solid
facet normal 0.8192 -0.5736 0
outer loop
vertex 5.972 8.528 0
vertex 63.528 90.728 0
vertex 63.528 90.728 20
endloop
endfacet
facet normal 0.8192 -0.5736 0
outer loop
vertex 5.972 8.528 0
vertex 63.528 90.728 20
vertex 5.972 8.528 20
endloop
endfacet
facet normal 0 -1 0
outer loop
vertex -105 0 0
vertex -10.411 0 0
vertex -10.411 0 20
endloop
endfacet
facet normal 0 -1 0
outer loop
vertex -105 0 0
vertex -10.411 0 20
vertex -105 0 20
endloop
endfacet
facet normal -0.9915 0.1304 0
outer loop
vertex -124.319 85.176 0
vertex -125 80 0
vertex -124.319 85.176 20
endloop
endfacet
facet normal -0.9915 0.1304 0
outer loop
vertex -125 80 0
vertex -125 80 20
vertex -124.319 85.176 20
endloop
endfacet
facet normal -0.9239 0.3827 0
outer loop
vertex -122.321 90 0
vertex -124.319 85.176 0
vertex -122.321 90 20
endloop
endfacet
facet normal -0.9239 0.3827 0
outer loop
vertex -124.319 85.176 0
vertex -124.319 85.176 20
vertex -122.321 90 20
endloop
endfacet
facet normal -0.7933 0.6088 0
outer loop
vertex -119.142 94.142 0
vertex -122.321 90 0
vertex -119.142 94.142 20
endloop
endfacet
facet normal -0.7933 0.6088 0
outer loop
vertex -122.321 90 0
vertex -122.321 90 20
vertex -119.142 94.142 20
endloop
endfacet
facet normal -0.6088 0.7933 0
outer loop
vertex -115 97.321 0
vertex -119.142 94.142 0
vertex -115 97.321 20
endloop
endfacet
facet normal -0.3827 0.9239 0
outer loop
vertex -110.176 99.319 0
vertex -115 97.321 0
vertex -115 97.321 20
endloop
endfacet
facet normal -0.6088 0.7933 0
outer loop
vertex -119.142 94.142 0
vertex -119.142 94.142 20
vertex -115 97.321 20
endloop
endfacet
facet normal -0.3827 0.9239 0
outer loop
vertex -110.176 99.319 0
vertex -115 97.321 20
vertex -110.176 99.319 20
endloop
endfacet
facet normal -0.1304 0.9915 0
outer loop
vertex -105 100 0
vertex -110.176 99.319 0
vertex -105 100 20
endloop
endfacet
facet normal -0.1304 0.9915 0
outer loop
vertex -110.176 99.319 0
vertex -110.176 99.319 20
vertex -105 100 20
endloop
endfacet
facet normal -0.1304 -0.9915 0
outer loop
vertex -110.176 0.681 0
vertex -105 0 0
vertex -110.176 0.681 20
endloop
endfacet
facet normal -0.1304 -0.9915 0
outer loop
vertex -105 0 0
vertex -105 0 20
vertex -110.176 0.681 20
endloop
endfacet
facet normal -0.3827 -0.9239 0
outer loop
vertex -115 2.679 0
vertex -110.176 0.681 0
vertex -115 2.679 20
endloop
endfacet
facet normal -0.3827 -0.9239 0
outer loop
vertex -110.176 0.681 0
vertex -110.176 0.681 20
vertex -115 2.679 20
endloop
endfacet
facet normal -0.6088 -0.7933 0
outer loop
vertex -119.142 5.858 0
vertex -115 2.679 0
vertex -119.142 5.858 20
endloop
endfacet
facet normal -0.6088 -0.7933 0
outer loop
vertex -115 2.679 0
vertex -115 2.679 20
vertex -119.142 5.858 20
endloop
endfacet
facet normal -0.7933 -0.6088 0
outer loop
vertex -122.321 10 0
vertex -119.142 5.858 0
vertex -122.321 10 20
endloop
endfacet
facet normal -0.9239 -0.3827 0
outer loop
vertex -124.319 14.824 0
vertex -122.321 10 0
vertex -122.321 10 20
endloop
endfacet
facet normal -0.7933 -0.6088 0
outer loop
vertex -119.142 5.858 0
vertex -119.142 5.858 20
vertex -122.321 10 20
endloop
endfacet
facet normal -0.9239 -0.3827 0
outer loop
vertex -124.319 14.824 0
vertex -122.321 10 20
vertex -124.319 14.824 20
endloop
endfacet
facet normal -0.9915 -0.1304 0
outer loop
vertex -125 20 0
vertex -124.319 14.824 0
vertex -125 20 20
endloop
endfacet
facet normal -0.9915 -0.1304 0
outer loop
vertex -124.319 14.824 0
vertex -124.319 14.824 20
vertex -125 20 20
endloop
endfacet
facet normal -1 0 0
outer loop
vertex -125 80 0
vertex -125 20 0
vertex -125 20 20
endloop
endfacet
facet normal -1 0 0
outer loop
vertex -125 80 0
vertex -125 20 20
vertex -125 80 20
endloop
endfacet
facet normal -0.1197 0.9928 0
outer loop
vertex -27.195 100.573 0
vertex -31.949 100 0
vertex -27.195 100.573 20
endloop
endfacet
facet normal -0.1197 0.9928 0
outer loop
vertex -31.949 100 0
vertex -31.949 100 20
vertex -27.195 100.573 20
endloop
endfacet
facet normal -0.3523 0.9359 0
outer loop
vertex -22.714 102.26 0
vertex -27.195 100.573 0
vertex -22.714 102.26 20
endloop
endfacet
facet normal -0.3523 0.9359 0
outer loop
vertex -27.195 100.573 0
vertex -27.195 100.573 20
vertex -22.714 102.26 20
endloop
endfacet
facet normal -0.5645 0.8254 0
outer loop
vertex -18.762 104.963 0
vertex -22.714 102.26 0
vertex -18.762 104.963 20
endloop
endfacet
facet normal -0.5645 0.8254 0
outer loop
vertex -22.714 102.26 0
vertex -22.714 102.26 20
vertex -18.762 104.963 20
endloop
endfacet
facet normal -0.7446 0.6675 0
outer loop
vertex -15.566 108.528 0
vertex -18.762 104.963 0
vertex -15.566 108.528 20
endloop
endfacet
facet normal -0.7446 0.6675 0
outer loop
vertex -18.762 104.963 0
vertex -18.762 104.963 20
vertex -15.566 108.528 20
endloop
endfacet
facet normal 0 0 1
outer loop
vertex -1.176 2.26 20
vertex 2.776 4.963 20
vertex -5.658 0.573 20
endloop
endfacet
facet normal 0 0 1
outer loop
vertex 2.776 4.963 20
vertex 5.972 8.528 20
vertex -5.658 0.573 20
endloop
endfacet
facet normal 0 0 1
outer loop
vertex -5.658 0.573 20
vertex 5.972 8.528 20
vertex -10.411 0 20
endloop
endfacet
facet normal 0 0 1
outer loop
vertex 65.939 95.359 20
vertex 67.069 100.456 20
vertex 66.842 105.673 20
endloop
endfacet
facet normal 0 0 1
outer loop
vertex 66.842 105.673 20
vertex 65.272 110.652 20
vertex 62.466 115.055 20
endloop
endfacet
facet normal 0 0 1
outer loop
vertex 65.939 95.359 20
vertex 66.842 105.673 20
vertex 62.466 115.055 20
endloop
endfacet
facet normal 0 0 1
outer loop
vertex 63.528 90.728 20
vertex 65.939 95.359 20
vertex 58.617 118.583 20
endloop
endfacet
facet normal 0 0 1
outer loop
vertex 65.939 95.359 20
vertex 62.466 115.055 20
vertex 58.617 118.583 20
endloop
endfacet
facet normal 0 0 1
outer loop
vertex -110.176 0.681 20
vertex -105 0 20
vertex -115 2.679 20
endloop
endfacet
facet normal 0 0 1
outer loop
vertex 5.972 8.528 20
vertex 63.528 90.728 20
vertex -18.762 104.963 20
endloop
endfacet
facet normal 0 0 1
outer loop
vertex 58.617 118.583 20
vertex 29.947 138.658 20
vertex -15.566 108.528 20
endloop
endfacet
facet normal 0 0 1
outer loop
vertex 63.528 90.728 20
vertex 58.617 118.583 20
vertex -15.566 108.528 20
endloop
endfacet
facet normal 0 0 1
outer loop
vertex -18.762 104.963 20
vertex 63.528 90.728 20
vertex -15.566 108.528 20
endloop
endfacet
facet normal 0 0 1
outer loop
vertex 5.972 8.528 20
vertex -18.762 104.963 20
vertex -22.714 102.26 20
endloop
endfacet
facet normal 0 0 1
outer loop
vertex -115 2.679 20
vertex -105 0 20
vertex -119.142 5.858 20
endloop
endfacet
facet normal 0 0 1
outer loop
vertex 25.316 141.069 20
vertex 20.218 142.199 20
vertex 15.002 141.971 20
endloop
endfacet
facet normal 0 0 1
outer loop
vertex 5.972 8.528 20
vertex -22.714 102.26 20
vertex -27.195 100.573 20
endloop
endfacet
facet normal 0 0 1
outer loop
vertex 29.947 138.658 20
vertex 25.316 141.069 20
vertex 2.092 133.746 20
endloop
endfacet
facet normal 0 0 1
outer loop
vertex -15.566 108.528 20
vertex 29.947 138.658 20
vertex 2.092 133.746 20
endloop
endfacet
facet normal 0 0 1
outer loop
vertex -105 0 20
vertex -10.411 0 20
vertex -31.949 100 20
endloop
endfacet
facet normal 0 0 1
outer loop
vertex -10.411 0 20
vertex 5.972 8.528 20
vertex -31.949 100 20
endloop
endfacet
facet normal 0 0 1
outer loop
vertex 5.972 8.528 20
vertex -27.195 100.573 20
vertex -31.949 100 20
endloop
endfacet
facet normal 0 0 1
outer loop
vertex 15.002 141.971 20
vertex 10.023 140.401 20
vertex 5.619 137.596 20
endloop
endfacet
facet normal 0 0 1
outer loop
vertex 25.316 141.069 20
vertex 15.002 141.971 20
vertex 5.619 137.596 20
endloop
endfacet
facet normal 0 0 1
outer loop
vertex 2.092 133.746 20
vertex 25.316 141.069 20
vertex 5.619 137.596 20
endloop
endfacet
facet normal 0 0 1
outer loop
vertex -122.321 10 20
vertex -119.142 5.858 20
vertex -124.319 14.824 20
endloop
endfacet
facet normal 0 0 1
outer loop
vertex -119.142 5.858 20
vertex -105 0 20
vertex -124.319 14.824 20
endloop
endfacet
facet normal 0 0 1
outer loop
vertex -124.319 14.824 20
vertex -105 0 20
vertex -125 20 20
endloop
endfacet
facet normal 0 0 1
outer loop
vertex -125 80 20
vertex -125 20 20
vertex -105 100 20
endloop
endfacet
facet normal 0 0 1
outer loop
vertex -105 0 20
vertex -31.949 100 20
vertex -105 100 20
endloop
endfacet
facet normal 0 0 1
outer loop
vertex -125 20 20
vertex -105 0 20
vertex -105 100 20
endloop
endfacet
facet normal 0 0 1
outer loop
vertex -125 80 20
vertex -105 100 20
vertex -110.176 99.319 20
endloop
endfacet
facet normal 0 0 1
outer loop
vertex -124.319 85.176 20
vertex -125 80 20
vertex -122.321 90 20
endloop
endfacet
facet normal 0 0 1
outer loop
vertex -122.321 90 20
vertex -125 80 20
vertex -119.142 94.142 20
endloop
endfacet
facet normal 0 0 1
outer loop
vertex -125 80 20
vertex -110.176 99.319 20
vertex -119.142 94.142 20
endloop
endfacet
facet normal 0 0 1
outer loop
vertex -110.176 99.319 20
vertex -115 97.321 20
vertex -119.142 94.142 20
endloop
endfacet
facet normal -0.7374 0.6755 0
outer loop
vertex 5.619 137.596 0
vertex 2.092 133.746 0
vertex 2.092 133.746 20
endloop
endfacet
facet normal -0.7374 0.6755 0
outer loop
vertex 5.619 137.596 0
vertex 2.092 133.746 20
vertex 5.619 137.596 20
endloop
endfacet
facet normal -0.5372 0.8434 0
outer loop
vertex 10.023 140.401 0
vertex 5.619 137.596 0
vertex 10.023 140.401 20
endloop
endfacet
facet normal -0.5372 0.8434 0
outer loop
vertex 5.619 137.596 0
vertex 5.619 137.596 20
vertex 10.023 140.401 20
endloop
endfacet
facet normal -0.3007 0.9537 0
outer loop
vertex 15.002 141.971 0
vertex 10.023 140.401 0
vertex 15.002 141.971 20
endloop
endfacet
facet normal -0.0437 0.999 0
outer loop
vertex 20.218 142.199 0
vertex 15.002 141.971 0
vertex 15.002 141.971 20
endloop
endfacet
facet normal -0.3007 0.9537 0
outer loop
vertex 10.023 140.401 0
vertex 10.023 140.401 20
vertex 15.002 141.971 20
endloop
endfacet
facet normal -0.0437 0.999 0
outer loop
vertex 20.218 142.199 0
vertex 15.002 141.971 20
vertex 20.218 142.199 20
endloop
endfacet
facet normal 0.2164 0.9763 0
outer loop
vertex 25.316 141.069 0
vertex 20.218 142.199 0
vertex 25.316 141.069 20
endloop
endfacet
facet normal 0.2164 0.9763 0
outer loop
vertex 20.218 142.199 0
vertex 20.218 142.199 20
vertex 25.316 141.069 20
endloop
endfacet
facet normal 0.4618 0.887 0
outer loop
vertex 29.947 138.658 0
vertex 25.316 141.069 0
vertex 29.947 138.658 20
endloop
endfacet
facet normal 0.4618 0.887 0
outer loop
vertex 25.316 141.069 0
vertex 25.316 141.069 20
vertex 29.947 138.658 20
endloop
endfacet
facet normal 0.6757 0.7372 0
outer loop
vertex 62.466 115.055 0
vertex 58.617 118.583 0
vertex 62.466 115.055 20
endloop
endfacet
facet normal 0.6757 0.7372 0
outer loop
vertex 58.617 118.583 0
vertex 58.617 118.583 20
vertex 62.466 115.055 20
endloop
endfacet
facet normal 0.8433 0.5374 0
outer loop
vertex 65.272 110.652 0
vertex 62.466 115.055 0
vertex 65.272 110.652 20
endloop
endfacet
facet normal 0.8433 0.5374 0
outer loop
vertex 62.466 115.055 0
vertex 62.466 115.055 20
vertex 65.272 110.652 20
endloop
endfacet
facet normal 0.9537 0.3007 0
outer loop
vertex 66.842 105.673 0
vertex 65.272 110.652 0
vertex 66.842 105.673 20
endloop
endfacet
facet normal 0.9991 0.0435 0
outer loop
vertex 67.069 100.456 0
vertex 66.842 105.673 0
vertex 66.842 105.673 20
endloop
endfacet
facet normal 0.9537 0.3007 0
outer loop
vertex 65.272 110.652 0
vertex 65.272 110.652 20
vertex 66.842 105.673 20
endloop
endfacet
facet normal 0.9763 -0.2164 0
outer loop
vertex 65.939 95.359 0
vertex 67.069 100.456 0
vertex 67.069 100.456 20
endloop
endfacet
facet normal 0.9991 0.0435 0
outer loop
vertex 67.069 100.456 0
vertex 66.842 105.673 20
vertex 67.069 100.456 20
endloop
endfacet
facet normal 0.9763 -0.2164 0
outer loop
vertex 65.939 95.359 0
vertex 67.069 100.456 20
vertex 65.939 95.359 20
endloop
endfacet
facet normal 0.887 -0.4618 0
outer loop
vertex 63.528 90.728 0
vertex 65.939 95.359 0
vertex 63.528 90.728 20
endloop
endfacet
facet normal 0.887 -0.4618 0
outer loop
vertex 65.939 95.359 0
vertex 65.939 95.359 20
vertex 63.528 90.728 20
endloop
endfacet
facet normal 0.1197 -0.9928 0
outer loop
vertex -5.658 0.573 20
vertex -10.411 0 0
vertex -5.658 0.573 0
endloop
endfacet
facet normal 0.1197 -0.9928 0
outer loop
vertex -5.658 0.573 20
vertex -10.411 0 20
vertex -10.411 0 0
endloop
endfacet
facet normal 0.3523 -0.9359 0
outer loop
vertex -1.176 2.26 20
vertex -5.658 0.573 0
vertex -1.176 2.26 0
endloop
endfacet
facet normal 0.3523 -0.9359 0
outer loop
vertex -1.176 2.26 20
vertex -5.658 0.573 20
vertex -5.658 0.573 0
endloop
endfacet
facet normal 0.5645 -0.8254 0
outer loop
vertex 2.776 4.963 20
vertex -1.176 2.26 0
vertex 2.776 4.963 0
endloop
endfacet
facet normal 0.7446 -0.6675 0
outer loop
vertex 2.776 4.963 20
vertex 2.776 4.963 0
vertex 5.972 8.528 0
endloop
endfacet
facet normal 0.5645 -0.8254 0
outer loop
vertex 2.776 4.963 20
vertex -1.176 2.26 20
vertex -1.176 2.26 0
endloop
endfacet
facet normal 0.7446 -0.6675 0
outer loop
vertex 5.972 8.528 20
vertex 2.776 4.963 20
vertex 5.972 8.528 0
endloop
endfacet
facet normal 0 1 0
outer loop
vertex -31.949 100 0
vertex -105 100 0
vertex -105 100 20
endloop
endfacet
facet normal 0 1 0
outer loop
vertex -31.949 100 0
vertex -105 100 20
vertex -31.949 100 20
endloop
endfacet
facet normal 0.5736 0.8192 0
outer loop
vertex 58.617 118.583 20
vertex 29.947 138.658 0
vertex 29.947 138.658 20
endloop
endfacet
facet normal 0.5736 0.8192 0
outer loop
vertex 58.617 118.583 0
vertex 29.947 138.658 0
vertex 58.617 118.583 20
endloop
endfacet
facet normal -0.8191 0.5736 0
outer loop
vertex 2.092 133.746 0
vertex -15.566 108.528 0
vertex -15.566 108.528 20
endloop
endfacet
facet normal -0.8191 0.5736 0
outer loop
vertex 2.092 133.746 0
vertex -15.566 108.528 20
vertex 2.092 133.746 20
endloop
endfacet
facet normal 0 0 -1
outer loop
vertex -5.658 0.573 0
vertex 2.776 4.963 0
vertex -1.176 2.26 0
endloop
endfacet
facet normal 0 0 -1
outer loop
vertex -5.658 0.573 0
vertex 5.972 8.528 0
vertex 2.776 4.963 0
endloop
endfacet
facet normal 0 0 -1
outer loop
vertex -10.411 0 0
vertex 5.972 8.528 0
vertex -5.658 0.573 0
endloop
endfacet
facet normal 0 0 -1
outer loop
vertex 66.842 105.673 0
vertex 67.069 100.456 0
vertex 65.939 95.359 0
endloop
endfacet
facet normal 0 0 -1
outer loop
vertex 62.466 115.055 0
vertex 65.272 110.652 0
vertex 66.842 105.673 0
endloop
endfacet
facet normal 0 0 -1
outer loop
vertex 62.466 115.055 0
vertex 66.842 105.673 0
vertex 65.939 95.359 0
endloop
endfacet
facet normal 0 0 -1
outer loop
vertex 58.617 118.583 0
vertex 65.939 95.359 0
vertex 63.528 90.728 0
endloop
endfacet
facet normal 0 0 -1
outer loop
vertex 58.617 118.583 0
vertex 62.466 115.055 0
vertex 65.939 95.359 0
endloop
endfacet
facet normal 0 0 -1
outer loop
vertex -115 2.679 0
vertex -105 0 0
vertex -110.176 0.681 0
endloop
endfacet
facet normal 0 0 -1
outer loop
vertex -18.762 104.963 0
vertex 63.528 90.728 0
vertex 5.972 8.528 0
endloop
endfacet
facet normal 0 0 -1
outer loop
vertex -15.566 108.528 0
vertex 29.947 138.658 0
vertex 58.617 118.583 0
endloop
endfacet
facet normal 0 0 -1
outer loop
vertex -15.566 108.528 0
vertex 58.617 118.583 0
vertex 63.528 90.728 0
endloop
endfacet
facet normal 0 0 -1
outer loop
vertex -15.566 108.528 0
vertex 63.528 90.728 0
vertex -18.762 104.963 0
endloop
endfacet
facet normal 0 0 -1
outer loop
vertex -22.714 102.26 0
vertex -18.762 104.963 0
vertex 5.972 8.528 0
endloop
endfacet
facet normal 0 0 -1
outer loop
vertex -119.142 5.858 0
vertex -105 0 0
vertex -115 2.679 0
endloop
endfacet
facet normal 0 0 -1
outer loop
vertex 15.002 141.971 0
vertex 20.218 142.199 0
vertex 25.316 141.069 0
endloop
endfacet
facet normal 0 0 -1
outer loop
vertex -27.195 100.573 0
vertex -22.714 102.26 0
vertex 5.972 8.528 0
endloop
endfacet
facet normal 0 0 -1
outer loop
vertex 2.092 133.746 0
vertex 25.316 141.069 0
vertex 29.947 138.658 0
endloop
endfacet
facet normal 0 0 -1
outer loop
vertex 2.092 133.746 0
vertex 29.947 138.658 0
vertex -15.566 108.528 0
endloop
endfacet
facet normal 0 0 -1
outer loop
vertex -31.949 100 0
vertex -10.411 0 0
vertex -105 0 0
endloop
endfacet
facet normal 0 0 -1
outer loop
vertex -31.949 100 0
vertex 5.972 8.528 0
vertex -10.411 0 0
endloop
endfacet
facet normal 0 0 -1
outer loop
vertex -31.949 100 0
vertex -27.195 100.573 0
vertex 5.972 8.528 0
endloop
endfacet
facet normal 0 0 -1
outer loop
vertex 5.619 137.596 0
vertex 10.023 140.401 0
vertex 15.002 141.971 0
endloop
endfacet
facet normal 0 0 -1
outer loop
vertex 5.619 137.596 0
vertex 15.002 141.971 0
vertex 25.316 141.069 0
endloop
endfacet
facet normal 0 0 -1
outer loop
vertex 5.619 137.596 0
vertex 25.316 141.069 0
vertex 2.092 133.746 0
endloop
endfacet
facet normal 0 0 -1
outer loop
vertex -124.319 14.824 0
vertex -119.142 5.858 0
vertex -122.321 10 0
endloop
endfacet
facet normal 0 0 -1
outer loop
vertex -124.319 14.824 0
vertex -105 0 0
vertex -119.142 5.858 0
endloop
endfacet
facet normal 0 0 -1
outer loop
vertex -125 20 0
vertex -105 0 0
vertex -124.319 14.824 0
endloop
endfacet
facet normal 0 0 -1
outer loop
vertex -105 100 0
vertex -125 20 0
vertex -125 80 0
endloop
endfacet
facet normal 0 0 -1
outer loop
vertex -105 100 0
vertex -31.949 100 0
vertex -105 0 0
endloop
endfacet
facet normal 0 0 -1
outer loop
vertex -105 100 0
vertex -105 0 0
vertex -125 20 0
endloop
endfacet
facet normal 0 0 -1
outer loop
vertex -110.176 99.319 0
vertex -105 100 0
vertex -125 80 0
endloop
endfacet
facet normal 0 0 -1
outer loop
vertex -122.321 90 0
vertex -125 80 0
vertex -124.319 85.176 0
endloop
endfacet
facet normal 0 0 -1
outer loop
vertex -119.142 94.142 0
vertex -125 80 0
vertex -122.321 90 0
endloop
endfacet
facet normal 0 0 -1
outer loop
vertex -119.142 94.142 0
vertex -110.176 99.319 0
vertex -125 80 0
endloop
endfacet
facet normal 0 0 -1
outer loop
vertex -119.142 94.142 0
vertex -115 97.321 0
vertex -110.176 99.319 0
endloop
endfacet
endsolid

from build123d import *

# Parameters (mm, degrees)
BOSS_EXTRUDE1_DEPTH = 20
FILLET1_R           = 20


with BuildPart() as part:
    # Sketch1 → Boss-Extrude1 (new body)
    with BuildSketch(Plane.XY):
        Polygon((0, 0), (-125, 0), (-125, 100), (-21.537340336, 100), (13.563596678, 150.129333232), (75, 107.111100506), align=None)
    extrude(amount=BOSS_EXTRUDE1_DEPTH)

    # Fillet1
    fillet1_edges = [part.edges().sort_by_distance(p)[0] for p in [
        (0, 0, 10),
        (-125, 0, 10),
        (-125, 100, 10),
        (-21.537340336, 100, 10),
        (13.563596678, 150.129333232, 10),
        (75, 107.111100506, 10),
    ]]
    fillet(fillet1_edges, radius=FILLET1_R)


solid = part.part
